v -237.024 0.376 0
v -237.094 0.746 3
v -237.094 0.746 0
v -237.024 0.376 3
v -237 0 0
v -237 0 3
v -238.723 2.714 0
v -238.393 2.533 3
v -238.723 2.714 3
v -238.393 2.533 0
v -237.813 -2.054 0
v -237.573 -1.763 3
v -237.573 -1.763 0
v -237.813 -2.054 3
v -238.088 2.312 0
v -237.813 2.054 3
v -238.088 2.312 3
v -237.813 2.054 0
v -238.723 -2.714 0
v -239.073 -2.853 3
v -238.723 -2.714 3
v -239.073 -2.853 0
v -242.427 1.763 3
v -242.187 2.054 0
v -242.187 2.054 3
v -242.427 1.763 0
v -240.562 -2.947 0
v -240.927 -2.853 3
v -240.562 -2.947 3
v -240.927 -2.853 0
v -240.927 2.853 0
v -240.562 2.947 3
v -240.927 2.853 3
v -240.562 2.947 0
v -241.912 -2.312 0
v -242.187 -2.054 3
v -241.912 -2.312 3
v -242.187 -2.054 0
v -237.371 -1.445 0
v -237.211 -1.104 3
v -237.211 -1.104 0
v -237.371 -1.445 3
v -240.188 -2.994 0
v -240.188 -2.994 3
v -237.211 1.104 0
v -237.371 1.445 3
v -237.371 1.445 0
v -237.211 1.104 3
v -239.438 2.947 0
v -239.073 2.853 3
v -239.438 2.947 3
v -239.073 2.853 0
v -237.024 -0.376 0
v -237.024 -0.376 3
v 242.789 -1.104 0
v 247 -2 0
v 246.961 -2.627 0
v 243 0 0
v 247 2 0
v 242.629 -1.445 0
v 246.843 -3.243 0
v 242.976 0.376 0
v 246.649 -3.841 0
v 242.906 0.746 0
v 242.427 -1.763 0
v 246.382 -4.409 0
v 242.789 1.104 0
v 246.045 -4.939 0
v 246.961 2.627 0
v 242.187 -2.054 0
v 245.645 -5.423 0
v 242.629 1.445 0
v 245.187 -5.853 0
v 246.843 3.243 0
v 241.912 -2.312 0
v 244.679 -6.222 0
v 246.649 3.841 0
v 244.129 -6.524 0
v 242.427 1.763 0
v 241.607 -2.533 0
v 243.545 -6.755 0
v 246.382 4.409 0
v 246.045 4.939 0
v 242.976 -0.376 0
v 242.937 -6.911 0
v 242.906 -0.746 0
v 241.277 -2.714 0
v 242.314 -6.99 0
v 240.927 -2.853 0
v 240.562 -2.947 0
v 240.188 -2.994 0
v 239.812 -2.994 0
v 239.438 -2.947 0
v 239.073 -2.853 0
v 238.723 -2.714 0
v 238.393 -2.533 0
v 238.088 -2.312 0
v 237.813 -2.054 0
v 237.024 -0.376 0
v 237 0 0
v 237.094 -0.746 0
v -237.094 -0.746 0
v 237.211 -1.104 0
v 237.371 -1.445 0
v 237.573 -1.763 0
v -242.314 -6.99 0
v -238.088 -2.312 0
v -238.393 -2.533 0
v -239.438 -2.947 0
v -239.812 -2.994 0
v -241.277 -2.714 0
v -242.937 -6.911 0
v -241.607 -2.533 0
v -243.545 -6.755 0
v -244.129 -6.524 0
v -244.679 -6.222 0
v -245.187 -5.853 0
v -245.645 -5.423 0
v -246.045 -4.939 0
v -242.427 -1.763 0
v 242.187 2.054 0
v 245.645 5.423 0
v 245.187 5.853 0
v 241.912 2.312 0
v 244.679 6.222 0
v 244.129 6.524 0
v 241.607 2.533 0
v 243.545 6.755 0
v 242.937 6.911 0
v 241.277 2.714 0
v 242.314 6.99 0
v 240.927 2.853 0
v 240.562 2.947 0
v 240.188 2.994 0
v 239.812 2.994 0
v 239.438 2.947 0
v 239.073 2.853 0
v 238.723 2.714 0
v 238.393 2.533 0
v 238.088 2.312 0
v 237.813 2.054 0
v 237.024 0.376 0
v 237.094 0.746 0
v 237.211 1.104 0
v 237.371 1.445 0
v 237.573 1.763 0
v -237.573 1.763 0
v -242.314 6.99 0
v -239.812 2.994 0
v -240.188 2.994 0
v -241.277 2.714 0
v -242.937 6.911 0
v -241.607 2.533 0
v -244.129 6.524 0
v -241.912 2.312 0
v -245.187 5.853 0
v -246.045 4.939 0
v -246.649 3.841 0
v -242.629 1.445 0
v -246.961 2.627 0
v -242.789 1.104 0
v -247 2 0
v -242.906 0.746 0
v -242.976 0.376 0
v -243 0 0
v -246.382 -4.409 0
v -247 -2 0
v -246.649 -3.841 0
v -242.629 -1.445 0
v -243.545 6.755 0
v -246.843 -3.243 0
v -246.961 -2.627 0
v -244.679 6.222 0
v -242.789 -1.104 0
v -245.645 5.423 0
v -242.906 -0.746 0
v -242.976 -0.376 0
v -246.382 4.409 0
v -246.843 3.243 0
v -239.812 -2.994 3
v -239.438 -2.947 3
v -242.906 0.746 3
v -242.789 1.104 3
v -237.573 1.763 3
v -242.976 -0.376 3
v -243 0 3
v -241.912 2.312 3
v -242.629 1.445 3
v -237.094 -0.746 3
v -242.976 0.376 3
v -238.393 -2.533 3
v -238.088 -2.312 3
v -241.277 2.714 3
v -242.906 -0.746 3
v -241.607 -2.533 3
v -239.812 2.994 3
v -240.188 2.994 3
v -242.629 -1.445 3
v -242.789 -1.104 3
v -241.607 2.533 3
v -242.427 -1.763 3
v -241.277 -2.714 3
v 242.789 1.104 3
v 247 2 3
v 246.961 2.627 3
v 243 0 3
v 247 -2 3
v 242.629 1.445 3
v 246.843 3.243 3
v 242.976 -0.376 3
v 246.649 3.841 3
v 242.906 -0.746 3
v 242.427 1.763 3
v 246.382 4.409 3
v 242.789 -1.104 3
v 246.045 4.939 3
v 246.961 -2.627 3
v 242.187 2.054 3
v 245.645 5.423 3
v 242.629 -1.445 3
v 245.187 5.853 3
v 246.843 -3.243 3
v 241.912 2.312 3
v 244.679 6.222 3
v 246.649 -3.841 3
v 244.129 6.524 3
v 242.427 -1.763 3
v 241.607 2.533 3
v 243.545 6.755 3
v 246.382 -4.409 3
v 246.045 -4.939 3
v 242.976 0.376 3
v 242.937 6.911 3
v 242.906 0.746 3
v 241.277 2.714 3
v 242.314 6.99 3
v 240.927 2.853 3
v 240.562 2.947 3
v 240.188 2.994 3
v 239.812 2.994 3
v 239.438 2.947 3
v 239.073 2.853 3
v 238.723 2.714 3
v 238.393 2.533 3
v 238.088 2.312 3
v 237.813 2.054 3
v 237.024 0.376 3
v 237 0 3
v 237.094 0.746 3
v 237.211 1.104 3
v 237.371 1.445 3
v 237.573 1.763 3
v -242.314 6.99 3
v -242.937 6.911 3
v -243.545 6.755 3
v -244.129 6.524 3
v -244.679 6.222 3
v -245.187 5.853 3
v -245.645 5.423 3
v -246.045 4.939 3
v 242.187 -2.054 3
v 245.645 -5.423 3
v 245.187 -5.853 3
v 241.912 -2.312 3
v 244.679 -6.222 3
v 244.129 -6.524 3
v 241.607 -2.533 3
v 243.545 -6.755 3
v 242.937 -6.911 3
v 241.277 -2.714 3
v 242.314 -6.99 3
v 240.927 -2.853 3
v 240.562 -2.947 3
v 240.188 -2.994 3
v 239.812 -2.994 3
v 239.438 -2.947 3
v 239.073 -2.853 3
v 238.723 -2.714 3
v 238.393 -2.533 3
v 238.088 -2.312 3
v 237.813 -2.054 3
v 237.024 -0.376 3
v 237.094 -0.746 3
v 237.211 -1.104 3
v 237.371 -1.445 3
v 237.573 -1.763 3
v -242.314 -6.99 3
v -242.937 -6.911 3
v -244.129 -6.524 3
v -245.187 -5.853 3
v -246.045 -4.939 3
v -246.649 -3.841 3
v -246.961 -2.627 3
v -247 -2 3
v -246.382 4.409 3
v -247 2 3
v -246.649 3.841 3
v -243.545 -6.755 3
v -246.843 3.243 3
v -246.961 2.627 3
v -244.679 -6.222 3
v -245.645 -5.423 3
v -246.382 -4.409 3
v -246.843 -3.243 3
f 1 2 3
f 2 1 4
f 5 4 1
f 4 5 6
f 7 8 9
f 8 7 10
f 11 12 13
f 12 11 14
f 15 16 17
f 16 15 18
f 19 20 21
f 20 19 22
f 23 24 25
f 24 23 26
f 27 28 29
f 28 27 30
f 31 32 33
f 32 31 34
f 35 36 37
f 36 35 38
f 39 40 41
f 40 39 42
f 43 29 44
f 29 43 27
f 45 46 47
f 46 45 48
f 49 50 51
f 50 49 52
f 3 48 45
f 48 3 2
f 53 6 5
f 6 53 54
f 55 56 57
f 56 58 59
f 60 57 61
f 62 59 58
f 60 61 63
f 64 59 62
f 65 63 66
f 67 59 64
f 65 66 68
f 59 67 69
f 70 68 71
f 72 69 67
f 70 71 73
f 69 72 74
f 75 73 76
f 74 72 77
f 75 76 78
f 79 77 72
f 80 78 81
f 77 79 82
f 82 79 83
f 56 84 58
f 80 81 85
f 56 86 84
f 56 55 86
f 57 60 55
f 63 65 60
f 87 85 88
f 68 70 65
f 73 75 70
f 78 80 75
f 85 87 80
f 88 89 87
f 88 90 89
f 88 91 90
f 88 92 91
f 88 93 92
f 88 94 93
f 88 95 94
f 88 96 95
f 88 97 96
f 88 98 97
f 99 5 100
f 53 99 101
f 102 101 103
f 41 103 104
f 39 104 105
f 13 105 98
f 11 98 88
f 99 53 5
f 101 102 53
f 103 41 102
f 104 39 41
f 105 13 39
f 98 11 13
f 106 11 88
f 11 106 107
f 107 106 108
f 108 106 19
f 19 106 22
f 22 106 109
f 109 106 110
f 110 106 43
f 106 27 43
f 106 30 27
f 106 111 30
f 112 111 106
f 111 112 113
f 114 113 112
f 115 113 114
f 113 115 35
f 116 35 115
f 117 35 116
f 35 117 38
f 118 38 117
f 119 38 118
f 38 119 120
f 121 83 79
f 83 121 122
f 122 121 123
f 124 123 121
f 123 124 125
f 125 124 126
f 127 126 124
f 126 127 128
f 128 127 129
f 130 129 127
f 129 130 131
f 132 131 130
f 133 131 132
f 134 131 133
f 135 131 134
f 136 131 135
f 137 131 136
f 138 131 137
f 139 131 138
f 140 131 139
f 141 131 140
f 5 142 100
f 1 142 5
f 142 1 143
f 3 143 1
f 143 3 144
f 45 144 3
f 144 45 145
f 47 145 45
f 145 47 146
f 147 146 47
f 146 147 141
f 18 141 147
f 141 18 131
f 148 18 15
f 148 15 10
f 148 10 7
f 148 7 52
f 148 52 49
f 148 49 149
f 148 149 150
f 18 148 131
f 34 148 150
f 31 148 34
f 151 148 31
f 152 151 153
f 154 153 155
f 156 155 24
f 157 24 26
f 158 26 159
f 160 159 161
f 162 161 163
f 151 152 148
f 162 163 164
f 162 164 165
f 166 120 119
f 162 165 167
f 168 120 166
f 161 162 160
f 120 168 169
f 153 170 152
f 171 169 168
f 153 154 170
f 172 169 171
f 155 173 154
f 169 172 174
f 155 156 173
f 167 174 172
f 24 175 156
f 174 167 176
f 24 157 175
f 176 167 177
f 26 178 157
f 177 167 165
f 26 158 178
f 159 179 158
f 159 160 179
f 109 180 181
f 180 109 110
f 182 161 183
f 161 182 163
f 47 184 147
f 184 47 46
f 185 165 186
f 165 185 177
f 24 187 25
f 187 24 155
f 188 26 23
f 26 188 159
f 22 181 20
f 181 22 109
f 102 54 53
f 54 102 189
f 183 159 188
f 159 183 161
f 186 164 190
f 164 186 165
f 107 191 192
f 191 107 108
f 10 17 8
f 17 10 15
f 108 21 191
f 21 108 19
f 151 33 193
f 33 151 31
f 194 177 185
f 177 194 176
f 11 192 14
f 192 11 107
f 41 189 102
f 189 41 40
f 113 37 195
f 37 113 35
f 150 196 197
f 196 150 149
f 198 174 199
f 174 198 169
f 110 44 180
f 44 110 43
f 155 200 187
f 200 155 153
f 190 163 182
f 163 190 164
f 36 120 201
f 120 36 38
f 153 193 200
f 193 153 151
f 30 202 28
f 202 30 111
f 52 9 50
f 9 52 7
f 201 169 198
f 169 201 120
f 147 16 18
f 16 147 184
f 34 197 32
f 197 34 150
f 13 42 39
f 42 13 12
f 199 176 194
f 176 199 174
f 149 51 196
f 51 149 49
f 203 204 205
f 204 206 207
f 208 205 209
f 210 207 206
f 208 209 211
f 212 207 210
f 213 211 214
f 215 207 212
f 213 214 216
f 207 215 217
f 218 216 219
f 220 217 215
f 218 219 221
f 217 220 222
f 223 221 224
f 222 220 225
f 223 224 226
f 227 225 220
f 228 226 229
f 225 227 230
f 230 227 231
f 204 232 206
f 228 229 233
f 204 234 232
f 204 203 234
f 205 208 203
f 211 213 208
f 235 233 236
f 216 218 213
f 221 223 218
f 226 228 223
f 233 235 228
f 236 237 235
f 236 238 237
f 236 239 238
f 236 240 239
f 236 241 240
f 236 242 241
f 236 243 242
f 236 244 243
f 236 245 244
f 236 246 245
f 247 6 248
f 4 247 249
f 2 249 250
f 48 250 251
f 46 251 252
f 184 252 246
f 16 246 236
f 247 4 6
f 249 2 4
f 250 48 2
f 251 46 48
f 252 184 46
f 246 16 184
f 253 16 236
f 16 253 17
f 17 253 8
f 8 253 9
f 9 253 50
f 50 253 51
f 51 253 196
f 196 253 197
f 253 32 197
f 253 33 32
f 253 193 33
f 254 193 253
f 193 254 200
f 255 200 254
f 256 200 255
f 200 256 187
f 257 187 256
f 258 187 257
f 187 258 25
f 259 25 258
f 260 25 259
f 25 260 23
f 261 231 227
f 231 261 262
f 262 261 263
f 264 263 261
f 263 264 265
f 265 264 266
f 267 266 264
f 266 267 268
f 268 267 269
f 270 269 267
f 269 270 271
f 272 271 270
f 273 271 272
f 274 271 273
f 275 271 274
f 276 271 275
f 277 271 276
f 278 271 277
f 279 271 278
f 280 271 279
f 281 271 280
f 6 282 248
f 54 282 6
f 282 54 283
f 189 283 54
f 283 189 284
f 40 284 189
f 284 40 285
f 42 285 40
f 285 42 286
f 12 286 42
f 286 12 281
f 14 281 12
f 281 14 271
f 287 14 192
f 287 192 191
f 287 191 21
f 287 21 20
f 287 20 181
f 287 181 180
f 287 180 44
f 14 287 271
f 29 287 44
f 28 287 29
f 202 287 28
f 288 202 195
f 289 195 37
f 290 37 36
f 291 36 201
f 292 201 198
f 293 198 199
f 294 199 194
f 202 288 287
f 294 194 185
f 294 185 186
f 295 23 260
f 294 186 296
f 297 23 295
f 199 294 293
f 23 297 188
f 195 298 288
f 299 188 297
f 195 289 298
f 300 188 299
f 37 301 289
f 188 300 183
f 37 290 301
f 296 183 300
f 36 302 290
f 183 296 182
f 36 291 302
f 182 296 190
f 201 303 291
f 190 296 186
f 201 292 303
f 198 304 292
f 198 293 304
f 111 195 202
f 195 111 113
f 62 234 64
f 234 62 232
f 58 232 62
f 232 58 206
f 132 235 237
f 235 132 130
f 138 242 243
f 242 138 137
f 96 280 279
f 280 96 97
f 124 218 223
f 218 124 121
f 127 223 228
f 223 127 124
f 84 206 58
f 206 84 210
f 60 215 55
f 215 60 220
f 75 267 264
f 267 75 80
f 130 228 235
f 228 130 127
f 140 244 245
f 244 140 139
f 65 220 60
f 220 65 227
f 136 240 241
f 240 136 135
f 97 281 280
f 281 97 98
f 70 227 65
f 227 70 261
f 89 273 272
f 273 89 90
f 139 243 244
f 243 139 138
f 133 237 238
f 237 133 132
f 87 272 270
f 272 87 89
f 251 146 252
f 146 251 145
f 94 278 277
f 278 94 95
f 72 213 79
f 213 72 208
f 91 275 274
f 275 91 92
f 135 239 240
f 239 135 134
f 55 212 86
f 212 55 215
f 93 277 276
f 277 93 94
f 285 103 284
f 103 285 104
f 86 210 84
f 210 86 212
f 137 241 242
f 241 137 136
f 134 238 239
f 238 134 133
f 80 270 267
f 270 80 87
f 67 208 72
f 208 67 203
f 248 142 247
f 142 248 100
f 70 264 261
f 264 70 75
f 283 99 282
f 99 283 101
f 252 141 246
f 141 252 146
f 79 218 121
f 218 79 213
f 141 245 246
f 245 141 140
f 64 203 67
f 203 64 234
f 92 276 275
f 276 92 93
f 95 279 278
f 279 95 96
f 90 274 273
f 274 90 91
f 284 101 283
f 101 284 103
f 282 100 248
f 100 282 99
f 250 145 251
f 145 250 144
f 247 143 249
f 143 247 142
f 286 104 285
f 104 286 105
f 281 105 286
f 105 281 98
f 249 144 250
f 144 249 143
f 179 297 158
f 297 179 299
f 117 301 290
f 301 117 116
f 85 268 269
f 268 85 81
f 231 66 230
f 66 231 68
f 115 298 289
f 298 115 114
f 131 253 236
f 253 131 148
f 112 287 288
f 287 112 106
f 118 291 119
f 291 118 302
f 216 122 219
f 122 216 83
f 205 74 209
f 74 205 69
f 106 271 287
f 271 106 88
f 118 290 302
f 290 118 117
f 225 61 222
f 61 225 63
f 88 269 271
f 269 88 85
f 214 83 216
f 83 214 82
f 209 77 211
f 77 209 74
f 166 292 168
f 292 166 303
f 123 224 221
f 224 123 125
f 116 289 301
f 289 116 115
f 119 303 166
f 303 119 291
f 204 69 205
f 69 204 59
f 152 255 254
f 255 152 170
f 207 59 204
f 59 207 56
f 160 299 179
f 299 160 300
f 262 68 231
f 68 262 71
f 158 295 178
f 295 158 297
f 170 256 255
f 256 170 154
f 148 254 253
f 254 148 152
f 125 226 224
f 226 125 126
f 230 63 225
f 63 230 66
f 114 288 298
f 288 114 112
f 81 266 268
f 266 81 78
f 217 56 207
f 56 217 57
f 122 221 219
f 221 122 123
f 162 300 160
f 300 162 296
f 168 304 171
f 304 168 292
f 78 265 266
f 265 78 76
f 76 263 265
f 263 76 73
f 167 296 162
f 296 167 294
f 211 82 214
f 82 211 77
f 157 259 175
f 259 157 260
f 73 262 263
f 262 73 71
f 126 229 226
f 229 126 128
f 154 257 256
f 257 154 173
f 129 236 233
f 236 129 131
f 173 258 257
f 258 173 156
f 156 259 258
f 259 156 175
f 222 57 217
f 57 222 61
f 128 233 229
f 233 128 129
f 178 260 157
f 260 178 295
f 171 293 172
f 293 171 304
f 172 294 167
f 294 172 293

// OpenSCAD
$fn = 50;


difference() {
	union() {
		hull() {
			translate(v = [-242.0000000000, 2.0000000000, 0]) {
				cylinder(h = 3, r = 5);
			}
			translate(v = [242.0000000000, 2.0000000000, 0]) {
				cylinder(h = 3, r = 5);
			}
			translate(v = [-242.0000000000, -2.0000000000, 0]) {
				cylinder(h = 3, r = 5);
			}
			translate(v = [242.0000000000, -2.0000000000, 0]) {
				cylinder(h = 3, r = 5);
			}
		}
	}
	union() {
		translate(v = [-240.0000000000, 0.0000000000, 0]) {
			cylinder(h = 3, r = 3.0000000000);
		}
		translate(v = [240.0000000000, 0.0000000000, 0]) {
			cylinder(h = 3, r = 3.0000000000);
		}
		translate(v = [-240.0000000000, 0.0000000000, 0]) {
			cylinder(h = 3, r = 1.5000000000);
		}
		translate(v = [240.0000000000, 0.0000000000, 0]) {
			cylinder(h = 3, r = 1.5000000000);
		}
		translate(v = [-240.0000000000, 0.0000000000, 0]) {
			cylinder(h = 3, r = 1.5000000000);
		}
		translate(v = [240.0000000000, 0.0000000000, 0]) {
			cylinder(h = 3, r = 1.5000000000);
		}
		translate(v = [-240.0000000000, 0.0000000000, 0]) {
			cylinder(h = 3, r = 1.5000000000);
		}
		translate(v = [240.0000000000, 0.0000000000, 0]) {
			cylinder(h = 3, r = 1.5000000000);
		}
	}
}
